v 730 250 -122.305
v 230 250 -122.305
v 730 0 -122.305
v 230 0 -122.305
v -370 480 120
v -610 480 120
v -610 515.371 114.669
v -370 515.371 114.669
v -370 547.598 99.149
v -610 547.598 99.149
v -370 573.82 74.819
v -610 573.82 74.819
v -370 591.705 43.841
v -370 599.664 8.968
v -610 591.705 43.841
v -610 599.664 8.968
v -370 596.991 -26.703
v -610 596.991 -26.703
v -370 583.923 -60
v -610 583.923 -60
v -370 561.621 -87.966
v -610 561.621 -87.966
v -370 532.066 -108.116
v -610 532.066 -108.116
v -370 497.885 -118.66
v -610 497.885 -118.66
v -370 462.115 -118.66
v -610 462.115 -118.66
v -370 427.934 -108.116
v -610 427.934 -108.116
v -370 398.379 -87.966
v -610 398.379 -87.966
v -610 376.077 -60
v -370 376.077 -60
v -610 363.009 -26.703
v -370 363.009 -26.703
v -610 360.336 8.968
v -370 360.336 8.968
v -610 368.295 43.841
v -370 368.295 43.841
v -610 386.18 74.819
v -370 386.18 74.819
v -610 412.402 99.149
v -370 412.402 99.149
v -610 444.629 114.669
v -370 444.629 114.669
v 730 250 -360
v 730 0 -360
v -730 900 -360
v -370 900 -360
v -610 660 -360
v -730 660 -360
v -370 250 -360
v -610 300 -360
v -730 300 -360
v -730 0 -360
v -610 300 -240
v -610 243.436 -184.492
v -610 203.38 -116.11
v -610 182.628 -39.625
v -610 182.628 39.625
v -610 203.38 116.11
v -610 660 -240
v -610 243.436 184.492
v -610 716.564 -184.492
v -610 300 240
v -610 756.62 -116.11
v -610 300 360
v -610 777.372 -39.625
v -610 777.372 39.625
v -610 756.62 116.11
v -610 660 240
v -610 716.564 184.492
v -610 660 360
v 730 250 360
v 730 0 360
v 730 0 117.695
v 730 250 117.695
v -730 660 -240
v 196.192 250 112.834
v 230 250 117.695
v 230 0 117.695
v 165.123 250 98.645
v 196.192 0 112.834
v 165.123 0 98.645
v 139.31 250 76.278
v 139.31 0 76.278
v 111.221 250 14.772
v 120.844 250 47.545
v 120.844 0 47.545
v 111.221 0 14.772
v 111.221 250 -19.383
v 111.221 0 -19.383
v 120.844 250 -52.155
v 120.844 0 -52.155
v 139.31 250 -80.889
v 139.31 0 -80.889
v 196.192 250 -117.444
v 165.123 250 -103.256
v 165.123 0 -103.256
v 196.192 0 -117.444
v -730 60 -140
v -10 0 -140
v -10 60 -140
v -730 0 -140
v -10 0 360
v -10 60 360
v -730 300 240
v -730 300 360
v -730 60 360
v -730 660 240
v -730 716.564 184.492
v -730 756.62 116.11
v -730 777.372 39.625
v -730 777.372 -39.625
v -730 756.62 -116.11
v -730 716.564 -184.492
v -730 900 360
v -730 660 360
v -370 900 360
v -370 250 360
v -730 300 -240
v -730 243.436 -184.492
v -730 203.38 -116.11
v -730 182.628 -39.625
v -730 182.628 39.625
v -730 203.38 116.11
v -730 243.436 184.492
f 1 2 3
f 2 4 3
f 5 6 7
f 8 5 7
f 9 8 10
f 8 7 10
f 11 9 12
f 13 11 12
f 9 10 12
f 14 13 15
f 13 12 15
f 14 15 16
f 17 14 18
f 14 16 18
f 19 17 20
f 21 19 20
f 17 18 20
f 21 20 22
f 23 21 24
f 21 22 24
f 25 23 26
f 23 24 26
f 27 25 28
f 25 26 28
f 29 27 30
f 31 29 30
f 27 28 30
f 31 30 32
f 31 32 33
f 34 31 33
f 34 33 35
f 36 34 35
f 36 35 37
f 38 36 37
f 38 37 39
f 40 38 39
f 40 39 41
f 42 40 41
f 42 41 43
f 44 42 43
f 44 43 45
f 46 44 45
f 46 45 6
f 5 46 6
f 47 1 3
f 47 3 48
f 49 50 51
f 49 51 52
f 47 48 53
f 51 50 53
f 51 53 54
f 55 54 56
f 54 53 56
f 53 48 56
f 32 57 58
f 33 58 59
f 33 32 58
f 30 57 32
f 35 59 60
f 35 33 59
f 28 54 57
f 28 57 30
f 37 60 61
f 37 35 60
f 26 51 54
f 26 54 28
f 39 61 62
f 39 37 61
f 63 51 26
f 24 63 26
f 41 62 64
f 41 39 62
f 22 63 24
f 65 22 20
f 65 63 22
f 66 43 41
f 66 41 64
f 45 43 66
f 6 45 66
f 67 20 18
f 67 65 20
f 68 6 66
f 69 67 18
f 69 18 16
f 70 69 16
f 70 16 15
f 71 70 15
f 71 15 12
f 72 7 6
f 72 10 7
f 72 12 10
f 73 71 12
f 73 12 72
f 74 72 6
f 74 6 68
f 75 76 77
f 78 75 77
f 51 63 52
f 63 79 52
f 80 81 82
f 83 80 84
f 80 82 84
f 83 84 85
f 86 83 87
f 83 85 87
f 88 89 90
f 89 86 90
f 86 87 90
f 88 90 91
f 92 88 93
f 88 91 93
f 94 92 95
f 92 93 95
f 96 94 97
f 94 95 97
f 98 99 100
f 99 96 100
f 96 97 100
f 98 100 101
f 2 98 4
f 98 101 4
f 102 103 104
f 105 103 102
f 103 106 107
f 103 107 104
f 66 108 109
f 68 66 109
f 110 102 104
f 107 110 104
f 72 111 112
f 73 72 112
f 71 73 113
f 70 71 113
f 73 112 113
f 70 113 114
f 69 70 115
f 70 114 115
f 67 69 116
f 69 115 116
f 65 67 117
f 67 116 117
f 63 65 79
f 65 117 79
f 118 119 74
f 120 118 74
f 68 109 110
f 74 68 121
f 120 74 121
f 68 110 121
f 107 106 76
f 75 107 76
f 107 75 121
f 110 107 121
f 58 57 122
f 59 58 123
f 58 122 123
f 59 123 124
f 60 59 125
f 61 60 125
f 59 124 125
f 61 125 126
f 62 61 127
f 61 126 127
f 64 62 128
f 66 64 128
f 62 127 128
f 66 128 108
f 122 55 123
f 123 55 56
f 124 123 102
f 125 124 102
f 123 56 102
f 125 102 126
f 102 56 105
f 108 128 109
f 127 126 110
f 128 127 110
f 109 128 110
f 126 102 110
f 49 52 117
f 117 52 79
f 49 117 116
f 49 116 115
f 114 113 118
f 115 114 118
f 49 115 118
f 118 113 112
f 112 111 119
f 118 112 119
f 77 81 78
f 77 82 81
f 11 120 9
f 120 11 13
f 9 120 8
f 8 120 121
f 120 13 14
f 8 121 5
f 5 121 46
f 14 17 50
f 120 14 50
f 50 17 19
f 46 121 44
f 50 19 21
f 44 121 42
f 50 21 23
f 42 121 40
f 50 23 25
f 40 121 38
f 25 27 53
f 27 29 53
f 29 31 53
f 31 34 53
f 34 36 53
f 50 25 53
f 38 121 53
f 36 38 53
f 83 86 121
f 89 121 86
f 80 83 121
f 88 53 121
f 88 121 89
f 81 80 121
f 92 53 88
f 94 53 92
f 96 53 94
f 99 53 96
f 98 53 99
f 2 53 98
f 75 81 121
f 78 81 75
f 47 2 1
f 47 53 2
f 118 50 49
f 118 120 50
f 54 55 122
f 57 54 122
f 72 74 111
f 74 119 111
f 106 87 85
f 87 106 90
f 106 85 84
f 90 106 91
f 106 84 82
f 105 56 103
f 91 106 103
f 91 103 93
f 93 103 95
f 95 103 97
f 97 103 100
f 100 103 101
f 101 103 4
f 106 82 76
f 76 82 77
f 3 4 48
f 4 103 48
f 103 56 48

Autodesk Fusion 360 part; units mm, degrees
sketch "Sketch2" plane through (0, 0, 0) normal (0, 1, 0) x (1, 0, 0)
  line L0 (730, 360) -> (-730, 360)
  line L1 (-730, 360) -> (-730, -360)
  line L2 (-730, -360) -> (730, -360)
  line L3 (730, -360) -> (730, 360)
  line L4 (730, 360) -> (-730, -360) construction
  line L5 (-730, 360) -> (730, -360) construction
  line L6 (-730, -360) -> (-10, -360)
  line L7 (-10, -360) -> (-10, 140)
  line L8 (-10, 140) -> (-730, 140)
  line L9 (-730, 140) -> (-730, -360)
  line L10 (230, 2.3053) -> (230, 122.3053)
  line L11 (230, 122.3053) -> (730, 122.3053)
  line L12 (230, -117.6947) -> (730, -117.6947)
  arc A0 (245.8705, 121.2512) -> (238.1032, -117.4208) centre (230, 2.3053) ccw
  dimension "d7" = 1460
  dimension "d8" = 720
  dimension "d9" = 720
  dimension "d10" = 500
  dimension "d11" = 240
  dimension "d12" = 500
  dimension "d13" = 90
extrude "Extrude1" add sketch "Sketch2" along normal blind 250 contours L0 L1 L2 L3 L7 L8 L11 L12 A0 | L1 L2 L6 L7 L8 L9
extrude "Extrude2" cut sketch "Sketch2" along normal blind 60 contours L1 L2 L6 L7 L8 L9
sketch "Sketch3" plane through (0, 250, 0) normal (0, 1, 0) x (-1, 0, 0)
  arc A0 (-230, -122.3053) -> (-230, 117.6947) centre (-230, -2.3053) ccw
  line L0 (-230, -122.3053) -> (-730, -122.3053)
  line L1 (-730, -122.3053) -> (-730, -360)
  line L2 (-730, -360) -> (730, -360)
  line L3 (730, -360) -> (730, 360)
  line L4 (730, 360) -> (-730, 360)
  line L5 (-730, 360) -> (-730, 117.6947)
  line L6 (-730, 117.6947) -> (-230, 117.6947)
  line L7 (730, 360) -> (370, 360)
  line L8 (370, 360) -> (370, -360)
  line L9 (370, -360) -> (730, -360)
  line L10 (730, -360) -> (730, 360)
  dimension "d18" = 360
extrude "Extrude3" add sketch "Sketch3" along normal blind 650 contours L2 L3 L4 L7 L8 L9 L10
sketch "Sketch4" plane through (-730, 0, 0) normal (-1, 0, 0) x (0, 0, 1)
  line L0 (-140, 0) -> (-140, 60)
  line L1 (-140, 60) -> (360, 60)
  line L2 (360, 60) -> (360, 900)
  line L3 (360, 900) -> (-360, 900)
  line L4 (-360, 900) -> (-360, 0)
  line L5 (-360, 0) -> (-140, 0)
  circle A0 centre (0, 480) radius 120
  circle A1 centre (0, 480) radius 300
  line L6 (-360, 900) -> (360, 900)
  line L7 (360, 900) -> (360, 660)
  line L8 (360, 660) -> (-360, 660)
  line L9 (-360, 660) -> (-360, 900)
  line L10 (360, 60) -> (-360, 60)
  line L11 (-360, 60) -> (-360, 300)
  line L12 (-360, 300) -> (360, 300)
  line L13 (360, 300) -> (360, 60)
  dimension "d21" = 240
  dimension "d22" = 600
  dimension "d23" = 480
  dimension "d24" = 240
  dimension "d25" = 240
extrude "Extrude4" cut sketch "Sketch4" against normal through all contours A0
extrude "Extrude5" cut sketch "Sketch4" against normal blind 120 contours L2 A1 L8 L12 | L4 A1 L8 L12 | A1 L8 L12 | A1 L12 | A1 L8
